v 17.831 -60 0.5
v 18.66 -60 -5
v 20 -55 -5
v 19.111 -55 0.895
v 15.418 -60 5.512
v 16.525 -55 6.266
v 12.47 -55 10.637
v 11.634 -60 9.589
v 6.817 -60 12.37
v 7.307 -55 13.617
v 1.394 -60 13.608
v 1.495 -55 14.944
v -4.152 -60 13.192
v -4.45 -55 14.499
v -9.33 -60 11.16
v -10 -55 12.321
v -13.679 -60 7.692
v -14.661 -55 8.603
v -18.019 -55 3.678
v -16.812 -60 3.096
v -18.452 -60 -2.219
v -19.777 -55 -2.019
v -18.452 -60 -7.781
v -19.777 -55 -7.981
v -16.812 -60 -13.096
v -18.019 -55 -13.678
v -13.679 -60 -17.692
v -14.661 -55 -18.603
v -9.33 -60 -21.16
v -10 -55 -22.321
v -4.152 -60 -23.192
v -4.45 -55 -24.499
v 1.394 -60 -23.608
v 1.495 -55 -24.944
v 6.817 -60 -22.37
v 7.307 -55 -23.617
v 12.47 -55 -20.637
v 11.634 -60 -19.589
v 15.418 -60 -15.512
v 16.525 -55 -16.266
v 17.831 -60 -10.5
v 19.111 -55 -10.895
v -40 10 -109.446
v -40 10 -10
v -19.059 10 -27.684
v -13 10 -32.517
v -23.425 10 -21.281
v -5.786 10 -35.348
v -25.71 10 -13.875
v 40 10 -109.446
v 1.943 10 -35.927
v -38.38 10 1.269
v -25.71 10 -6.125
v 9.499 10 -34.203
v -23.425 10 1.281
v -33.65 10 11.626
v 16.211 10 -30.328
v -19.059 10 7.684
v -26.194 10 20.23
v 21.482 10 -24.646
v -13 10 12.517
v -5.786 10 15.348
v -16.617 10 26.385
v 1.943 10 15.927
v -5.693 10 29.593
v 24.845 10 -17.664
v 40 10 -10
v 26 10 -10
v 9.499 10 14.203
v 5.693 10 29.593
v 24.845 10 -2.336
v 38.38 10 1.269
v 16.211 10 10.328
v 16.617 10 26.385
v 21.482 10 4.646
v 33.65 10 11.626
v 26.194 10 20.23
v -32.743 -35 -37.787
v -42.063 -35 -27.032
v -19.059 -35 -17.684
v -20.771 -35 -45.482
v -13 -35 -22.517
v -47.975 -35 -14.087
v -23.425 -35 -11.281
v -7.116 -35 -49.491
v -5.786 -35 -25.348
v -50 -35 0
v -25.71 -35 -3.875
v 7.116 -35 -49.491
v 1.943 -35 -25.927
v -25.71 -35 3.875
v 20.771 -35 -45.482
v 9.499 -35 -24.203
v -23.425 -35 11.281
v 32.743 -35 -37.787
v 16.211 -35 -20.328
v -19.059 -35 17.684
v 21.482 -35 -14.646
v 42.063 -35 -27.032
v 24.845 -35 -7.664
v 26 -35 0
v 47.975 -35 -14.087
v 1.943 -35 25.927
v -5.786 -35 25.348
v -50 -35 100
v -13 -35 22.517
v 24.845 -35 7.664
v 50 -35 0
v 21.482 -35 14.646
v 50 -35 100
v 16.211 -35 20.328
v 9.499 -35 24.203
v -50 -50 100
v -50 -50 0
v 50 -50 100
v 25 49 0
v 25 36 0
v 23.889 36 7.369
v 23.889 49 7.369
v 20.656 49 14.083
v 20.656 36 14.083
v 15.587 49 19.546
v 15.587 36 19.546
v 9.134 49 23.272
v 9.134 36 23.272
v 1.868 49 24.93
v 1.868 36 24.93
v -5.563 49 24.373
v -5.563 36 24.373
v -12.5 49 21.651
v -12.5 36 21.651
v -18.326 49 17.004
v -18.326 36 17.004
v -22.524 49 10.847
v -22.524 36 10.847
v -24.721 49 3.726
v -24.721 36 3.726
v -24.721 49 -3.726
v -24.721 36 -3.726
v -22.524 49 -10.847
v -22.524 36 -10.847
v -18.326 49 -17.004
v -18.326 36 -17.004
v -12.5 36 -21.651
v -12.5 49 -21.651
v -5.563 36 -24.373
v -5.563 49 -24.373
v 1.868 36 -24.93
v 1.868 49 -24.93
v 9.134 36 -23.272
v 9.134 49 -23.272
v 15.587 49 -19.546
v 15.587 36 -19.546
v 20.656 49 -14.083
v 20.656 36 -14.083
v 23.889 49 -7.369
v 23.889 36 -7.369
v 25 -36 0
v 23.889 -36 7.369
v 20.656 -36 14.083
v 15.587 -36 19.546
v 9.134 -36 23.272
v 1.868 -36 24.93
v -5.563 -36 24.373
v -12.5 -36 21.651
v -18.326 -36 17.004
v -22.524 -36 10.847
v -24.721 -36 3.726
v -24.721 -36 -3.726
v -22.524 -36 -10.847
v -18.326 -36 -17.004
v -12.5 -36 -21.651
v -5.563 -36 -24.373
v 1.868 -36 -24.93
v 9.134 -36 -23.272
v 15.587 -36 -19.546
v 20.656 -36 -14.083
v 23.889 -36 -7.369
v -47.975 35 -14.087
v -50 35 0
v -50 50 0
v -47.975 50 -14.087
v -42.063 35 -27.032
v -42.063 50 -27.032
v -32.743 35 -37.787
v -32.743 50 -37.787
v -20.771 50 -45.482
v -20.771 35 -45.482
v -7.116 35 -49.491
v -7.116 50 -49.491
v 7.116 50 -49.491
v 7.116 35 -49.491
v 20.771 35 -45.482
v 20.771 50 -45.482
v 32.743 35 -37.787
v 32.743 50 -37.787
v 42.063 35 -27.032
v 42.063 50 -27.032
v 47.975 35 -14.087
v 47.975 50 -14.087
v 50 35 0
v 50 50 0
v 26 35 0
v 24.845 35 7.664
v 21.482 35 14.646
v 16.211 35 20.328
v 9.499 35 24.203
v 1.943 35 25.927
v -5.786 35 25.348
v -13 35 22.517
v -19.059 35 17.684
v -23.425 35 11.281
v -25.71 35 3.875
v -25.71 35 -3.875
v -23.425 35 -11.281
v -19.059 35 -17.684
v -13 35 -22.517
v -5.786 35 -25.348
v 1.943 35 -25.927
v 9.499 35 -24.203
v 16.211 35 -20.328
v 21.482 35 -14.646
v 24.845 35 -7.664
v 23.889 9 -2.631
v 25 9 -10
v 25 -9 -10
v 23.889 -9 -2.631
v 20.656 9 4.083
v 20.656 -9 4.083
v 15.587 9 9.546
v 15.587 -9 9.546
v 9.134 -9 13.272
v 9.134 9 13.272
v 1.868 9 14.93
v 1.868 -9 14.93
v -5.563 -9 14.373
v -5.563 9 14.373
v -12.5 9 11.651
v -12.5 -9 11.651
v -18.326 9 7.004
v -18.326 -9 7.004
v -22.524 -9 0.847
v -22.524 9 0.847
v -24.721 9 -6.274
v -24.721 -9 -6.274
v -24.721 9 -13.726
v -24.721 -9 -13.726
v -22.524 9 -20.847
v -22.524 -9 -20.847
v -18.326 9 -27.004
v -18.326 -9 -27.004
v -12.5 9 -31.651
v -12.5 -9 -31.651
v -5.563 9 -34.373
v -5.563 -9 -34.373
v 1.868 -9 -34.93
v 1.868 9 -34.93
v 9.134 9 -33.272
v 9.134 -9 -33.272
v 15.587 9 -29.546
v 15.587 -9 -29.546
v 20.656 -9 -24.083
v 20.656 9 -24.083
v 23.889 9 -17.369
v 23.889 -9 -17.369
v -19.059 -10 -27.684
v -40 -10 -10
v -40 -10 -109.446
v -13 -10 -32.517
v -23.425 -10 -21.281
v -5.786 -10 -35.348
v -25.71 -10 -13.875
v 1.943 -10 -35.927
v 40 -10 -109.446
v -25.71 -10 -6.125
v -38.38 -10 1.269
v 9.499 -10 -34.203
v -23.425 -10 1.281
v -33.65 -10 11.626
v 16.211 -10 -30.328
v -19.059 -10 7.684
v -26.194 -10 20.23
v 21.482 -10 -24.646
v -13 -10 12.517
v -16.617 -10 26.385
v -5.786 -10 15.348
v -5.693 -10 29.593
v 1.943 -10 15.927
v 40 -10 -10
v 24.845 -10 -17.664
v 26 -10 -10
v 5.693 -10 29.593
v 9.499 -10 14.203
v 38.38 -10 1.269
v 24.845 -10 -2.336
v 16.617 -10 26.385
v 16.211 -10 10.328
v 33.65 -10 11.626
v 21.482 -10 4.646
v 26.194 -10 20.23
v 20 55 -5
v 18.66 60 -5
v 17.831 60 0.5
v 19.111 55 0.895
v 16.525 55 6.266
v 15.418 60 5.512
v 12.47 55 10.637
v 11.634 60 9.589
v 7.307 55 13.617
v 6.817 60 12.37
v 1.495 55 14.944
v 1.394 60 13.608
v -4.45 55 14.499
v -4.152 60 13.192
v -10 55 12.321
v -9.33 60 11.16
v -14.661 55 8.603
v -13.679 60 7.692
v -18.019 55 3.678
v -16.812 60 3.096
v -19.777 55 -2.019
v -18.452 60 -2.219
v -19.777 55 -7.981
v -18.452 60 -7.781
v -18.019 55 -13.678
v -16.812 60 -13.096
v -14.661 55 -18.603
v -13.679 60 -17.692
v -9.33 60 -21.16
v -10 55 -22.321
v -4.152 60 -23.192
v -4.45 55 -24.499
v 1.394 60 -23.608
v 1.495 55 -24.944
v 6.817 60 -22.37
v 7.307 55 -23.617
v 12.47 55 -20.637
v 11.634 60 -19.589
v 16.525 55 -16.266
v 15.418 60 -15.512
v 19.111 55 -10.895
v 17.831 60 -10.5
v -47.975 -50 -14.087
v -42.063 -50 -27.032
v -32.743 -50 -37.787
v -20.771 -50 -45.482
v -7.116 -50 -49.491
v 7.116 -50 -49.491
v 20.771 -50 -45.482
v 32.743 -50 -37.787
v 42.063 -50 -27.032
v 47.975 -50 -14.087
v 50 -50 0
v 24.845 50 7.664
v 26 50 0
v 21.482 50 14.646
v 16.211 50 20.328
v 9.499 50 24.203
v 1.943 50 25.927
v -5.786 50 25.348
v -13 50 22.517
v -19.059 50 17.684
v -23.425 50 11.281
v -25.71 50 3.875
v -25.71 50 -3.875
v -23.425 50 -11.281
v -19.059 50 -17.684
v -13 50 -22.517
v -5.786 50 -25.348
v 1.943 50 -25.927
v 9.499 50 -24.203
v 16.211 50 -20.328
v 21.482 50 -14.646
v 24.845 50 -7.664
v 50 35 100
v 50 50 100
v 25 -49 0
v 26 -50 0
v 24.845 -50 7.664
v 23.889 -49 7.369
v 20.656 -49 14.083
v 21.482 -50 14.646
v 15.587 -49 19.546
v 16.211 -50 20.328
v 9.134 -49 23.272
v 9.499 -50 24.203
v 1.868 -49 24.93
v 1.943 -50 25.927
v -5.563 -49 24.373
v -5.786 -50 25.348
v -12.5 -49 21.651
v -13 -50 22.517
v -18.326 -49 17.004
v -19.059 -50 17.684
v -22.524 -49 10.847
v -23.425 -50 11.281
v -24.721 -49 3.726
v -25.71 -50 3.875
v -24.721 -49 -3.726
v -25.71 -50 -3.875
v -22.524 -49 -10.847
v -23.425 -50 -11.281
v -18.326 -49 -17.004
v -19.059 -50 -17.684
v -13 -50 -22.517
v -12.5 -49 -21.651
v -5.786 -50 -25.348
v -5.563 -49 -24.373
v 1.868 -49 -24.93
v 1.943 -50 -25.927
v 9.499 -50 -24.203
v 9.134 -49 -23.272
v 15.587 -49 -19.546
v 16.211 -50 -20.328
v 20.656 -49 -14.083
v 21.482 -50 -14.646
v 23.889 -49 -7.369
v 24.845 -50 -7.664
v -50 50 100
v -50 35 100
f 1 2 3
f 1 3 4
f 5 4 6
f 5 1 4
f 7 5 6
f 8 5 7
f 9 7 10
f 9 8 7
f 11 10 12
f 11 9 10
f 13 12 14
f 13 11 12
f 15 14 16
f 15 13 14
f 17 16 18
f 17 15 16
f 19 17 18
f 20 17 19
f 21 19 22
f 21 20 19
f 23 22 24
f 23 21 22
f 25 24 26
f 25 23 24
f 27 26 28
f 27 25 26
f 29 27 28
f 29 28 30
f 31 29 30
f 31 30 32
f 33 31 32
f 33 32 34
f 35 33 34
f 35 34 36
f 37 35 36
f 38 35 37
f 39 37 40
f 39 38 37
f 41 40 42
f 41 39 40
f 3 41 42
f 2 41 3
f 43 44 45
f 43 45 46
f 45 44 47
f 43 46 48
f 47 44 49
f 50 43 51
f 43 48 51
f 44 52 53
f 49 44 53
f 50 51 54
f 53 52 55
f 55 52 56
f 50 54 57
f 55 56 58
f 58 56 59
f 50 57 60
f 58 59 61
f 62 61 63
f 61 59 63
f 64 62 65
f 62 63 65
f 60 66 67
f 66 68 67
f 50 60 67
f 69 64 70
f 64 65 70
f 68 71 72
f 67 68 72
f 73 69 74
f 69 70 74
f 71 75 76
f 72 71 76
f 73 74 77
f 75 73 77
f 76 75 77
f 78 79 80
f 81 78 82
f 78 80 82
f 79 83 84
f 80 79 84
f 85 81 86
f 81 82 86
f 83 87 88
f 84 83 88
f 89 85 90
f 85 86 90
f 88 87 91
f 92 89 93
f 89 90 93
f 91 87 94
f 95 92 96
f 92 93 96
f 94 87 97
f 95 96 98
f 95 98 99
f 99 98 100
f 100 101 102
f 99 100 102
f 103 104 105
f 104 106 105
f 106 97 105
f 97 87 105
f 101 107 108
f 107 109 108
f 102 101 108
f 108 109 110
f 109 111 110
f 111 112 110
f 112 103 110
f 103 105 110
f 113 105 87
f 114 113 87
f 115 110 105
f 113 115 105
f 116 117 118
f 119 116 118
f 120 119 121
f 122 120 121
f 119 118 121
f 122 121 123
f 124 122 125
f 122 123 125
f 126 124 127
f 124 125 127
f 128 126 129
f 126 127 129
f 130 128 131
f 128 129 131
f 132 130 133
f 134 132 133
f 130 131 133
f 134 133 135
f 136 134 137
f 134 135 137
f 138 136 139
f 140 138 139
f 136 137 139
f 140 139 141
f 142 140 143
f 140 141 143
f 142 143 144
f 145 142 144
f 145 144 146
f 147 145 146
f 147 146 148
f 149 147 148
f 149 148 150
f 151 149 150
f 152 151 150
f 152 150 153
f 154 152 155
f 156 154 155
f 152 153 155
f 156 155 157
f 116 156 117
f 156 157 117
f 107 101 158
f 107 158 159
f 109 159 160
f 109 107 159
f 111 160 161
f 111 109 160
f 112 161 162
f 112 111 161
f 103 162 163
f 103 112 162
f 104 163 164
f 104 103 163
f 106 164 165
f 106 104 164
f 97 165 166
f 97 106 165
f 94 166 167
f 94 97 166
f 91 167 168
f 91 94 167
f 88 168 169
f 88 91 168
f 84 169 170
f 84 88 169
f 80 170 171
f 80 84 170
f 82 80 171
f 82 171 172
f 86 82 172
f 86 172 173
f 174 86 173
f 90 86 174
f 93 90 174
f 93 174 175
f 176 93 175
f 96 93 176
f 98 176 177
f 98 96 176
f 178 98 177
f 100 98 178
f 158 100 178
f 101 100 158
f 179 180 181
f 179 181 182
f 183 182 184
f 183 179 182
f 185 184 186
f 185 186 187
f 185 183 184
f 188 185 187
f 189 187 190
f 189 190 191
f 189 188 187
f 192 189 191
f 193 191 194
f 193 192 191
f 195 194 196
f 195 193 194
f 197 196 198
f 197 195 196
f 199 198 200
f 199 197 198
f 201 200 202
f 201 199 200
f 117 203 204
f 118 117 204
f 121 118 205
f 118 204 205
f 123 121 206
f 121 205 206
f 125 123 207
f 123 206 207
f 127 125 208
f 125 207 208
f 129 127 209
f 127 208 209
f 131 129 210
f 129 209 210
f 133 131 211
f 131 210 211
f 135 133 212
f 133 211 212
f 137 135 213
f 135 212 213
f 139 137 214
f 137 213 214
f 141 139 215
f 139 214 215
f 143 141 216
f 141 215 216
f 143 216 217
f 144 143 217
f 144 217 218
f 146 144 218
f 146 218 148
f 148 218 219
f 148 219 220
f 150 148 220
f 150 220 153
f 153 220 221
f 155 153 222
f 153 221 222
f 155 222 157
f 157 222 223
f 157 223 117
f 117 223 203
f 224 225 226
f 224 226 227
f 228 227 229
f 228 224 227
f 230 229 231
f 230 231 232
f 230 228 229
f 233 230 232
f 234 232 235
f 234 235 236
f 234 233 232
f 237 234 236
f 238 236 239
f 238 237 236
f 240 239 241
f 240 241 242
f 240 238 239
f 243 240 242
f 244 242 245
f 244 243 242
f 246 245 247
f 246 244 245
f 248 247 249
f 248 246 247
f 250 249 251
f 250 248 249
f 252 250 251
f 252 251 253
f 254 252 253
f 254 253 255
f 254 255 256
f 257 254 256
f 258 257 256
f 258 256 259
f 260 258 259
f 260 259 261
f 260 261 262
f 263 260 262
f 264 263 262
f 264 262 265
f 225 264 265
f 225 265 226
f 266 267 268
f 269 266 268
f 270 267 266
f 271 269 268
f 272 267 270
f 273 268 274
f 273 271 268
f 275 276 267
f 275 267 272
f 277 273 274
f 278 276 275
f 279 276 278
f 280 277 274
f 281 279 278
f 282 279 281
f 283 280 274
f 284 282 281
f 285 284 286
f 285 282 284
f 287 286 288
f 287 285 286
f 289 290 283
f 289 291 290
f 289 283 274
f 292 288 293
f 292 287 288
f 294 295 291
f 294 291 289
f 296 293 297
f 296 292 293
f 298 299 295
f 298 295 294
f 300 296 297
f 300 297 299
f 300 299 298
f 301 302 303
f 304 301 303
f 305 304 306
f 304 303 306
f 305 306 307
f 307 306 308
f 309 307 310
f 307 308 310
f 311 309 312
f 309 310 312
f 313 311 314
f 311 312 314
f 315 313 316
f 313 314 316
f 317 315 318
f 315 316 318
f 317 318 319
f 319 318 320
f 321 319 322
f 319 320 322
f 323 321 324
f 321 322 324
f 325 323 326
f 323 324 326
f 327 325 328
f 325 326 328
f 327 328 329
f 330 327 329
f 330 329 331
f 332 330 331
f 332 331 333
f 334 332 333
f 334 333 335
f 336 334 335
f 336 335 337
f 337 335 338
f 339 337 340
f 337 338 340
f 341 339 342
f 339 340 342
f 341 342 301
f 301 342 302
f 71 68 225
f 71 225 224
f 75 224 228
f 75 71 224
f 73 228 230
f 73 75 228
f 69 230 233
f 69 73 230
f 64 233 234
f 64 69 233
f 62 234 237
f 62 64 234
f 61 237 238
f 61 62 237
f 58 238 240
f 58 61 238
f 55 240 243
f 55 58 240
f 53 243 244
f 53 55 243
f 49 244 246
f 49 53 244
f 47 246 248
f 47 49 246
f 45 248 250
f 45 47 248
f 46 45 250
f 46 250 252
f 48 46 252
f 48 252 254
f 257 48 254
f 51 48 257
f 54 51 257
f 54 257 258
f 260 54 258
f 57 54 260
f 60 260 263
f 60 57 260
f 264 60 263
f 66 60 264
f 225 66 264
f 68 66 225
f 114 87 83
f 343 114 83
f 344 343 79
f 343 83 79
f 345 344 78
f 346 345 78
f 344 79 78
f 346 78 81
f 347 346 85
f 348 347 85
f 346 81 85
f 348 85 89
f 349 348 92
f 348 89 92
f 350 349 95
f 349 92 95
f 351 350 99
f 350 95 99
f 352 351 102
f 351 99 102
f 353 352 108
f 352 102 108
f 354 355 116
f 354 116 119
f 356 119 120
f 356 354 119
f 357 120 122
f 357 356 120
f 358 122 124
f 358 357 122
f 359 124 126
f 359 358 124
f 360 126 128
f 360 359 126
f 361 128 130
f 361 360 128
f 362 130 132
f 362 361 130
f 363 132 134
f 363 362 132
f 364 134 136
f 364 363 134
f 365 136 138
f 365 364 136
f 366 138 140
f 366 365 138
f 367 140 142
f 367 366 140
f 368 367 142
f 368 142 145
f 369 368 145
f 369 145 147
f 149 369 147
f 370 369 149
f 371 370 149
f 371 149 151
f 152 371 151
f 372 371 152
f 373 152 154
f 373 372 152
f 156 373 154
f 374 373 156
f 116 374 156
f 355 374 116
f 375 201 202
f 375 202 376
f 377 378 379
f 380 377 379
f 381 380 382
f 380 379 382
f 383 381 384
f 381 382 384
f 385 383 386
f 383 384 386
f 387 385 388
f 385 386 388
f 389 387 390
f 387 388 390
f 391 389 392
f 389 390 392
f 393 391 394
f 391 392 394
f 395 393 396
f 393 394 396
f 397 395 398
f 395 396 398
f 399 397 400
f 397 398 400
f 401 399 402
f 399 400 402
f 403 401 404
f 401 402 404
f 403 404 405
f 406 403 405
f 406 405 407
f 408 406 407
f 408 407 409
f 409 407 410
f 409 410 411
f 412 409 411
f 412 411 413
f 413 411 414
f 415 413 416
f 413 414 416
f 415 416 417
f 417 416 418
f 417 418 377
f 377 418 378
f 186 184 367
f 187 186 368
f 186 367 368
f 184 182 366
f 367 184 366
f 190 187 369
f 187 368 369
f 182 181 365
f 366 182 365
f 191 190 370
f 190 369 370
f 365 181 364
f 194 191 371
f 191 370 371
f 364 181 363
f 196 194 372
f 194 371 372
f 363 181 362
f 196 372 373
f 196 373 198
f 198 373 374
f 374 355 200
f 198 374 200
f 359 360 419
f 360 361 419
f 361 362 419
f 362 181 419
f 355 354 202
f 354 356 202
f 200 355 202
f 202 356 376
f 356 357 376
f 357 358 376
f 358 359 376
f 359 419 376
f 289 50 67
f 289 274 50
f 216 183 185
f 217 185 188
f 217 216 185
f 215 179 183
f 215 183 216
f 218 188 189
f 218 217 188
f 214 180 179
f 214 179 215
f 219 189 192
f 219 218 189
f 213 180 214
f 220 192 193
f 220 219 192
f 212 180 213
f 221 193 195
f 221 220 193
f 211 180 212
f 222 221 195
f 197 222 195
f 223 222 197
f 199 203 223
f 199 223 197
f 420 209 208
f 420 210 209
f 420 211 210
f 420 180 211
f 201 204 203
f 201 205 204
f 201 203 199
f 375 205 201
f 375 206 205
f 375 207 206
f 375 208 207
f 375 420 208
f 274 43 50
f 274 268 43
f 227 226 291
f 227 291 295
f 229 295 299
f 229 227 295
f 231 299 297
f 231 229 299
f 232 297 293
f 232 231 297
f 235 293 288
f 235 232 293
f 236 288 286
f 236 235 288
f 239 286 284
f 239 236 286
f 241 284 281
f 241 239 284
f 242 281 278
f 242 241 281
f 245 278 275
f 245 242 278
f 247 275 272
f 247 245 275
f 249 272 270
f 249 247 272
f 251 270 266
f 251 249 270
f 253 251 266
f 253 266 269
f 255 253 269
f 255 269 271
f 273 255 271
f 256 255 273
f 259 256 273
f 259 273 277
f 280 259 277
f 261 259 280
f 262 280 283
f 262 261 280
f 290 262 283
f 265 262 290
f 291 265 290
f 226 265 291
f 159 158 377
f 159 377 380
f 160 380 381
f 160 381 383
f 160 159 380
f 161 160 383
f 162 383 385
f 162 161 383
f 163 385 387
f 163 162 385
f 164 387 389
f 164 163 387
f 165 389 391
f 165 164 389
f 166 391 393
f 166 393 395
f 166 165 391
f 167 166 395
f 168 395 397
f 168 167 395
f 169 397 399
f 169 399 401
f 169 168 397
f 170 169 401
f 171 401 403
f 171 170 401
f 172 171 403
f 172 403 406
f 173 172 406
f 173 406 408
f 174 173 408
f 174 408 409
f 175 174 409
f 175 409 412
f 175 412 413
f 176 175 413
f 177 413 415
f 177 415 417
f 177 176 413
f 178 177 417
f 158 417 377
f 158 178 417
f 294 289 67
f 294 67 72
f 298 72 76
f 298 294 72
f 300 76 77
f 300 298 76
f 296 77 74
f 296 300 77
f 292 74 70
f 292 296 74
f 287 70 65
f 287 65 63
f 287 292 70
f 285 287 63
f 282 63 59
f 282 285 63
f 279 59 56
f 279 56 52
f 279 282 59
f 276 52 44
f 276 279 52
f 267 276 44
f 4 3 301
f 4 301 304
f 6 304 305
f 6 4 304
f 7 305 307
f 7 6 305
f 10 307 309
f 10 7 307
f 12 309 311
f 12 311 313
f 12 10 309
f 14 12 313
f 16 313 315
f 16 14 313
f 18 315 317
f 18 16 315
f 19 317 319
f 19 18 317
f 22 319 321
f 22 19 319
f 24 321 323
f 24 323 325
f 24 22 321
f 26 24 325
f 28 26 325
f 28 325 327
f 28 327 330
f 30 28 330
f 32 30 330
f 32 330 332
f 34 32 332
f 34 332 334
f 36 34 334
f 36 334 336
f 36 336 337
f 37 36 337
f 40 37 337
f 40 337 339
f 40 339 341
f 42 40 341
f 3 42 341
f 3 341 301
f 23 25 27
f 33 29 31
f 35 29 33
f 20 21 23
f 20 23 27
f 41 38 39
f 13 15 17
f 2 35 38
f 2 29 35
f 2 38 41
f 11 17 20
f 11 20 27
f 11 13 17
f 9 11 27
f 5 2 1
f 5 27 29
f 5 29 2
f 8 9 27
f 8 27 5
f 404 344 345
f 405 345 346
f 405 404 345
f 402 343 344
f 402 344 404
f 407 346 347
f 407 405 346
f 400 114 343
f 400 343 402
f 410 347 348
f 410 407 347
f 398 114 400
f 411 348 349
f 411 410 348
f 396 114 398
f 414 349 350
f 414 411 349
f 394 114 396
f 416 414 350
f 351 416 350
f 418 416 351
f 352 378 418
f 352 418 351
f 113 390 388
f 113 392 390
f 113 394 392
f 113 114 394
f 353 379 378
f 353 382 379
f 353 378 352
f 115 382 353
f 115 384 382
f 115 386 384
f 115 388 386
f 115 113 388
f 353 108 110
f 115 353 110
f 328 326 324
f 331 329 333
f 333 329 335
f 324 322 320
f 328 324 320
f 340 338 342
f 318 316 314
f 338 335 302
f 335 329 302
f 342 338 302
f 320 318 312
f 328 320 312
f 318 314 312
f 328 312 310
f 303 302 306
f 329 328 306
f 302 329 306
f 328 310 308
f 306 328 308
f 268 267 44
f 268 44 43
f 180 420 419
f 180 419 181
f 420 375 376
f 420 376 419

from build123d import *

# Parameters (mm, degrees)
F1_START = 35
F0_R     = 25
F1_DEPTH = 15
F2_SIZE  = 1
F3_R     = 25
F4_DEPTH = 10
F5_SIZE  = 1
F7_R     = 20
F8_DEPTH = 60
F9_SIZE2 = 1.3397459622
F9_SIZE  = 5


with BuildPart() as f1:
    # F0 (on Front) → F1 (new body)
    with BuildSketch(Plane.XZ.offset(F1_START)):
        with BuildLine():
            Line((-50, 100), (-50, 0))
            ThreePointArc((-50, 0), (0, -50), (50, 0))
            Line((50, 0), (50, 100))
            Line((50, 100), (-50, 100))
        make_face()
        Circle(F0_R, mode=Mode.SUBTRACT)
    extrude(amount=F1_DEPTH)

    # F2
    f2_edges = [f1.edges().sort_by_distance(p)[0] for p in [
        (-25, -50, 0),
        (-25, -35, 0),
    ]]
    chamfer(f2_edges, length=F2_SIZE)


with BuildPart() as f4:
    # F3 (on Front) → F4 (new body, symmetric)
    with BuildSketch(Plane.XZ):
        with BuildLine():
            Line((40, -109.4460245647), (40, -10))
            ThreePointArc((40, -10), (0, 30), (-40, -10))
            Line((-40, -10), (-40, -109.4460245647))
            Line((-40, -109.4460245647), (40, -109.4460245647))
        make_face()
        with Locations((0, -10)):
            Circle(F3_R, mode=Mode.SUBTRACT)
    extrude(amount=F4_DEPTH, both=True)

    # F5
    f5_edges = [f4.edges().sort_by_distance(p)[0] for p in [
        (-25, -10, -10),
        (25, 0, -10),
        (-25, 10, -10),
    ]]
    chamfer(f5_edges, length=F5_SIZE)


with BuildPart() as f6_1:
    # F6: instance of F1
    add(f1.part.mirror(Plane.XZ))


with BuildPart() as f8:
    # F7 (on Front) → F8 (new body, symmetric)
    with BuildSketch(Plane.XZ):
        with Locations((0, -5)):
            Circle(F7_R)
    extrude(amount=F8_DEPTH, both=True)

    # F9
    f9_edges = [f8.edges().sort_by_distance(p)[0] for p in [
        (-20, -60, -5),
        (-20, 60, -5),
    ]]
    f9_side = f8.faces().sort_by_distance((-20, 0, -5))[0]
    chamfer(f9_edges, length=F9_SIZE, length2=F9_SIZE2, reference=f9_side)


solid = Compound([f1.part, f4.part, f6_1.part, f8.part])
